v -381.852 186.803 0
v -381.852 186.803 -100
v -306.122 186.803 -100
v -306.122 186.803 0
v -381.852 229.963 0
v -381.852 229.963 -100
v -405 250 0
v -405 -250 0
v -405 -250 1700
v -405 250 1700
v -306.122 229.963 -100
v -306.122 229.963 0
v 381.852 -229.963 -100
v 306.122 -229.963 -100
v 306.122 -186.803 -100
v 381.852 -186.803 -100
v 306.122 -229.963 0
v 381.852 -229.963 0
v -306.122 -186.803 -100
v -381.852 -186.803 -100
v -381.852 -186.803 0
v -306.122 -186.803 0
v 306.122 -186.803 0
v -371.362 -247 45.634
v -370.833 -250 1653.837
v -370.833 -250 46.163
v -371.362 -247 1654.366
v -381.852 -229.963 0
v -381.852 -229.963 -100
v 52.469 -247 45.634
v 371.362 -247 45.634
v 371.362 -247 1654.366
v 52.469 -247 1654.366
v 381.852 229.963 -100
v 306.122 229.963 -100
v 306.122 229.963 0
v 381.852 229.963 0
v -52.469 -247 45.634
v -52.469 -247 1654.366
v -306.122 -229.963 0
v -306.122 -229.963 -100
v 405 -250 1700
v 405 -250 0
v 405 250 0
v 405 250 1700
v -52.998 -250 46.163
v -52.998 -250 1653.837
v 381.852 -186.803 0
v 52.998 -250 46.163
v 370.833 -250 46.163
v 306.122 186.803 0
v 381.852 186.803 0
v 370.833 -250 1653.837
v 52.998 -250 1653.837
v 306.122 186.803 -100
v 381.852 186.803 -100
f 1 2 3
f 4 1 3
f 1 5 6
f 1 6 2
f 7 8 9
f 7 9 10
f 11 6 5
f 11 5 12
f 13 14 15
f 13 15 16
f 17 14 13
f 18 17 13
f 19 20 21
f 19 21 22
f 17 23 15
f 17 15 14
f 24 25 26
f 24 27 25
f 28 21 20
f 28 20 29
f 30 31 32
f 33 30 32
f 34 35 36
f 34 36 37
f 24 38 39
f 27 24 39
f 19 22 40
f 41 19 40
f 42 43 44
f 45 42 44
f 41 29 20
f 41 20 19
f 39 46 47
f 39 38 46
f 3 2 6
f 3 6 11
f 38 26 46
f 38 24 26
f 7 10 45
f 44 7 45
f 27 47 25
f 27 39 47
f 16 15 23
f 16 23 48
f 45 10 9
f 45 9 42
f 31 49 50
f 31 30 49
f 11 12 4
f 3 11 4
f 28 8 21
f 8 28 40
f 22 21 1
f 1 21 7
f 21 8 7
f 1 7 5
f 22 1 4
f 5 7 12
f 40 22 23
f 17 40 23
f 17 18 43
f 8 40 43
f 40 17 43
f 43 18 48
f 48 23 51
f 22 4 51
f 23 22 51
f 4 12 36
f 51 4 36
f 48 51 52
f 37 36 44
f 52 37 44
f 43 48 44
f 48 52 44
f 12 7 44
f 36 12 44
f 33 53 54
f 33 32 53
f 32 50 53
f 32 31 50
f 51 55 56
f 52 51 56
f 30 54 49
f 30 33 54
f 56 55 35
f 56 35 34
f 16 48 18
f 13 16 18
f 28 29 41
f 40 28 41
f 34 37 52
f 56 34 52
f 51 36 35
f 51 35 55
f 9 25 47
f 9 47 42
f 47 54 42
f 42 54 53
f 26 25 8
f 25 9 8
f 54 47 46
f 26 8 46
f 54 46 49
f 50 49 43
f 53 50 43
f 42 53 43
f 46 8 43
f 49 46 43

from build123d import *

# Parameters (mm, degrees)
F0_W     = 810
F0_H     = 500
F1_DEPTH = 1700
F2_W     = 75.7292719425
F2_H     = 43.1599973455
F3_DEPTH = 100
F4_W     = 317.8355082985
F4_H     = 1607.6748847961
F5_DEPTH = 3
F5_TAPER = -10


with BuildPart() as f1:
    # F0 (on Top) → F1 (new body)
    with BuildSketch(Plane.XY):
        Rectangle(F0_W, F0_H)
    extrude(amount=F1_DEPTH)

    # F2 (on face) → F3 (join)
    with BuildSketch(Plane(origin=(0, 0, 0), x_dir=(1, 0, 0), z_dir=(0, 0, -1))):
        with Locations((-343.9869582653, 208.3826959133)):
            Rectangle(F2_W, F2_H)
        with Locations((343.9869582653, 208.3826959133)):
            Rectangle(F2_W, F2_H)
        with Locations((343.9869582653, -208.3826959133)):
            Rectangle(F2_W, F2_H)
        with Locations((-343.9869582653, -208.3826959133)):
            Rectangle(F2_W, F2_H)
    extrude(amount=F3_DEPTH)

    # F4 (on face) → F5 (cut)
    with BuildSketch(Plane.XZ.offset(250)):
        with Locations((-211.9153991399, 850)):
            Rectangle(F4_W, F4_H)
        with Locations((211.9153991399, 850)):
            Rectangle(F4_W, F4_H)
    extrude(amount=-F5_DEPTH, taper=F5_TAPER, mode=Mode.SUBTRACT)


solid = f1.part
